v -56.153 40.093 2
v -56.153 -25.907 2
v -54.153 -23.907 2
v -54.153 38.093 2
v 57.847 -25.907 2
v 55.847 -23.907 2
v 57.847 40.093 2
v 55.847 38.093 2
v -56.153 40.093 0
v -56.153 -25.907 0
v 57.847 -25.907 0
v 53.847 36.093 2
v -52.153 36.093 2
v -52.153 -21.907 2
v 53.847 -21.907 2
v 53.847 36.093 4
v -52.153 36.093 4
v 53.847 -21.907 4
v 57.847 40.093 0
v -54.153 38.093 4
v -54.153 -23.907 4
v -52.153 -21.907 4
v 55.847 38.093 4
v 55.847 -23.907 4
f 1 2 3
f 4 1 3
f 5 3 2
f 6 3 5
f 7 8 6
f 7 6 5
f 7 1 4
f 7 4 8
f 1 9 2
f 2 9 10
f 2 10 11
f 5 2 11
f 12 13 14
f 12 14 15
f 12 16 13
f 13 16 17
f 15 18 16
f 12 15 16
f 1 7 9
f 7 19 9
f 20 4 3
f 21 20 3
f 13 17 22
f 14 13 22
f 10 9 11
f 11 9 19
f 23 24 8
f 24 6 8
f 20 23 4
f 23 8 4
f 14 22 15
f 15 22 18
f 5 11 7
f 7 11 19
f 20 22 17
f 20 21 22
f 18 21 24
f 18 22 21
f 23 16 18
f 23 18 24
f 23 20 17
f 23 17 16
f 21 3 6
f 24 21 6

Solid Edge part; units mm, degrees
sketch "Sketch1" plane through (0, 0, 0) normal (0, 0, 1) x (1, 0, 0)
  line L0 (-56.1534, -25.9068) -> (57.8466, -25.9068)
  line L1 (57.8466, -25.9068) -> (57.8466, 40.0932)
  line L2 (57.8466, 40.0932) -> (-56.1534, 40.0932)
  line L3 (-56.1534, 40.0932) -> (-56.1534, -25.9068)
extrude "Protrusion1" add sketch "Sketch1" along normal blind 2
sketch "Sketch2" plane through (0.8466, 7.0932, 2) normal (0, 0, 1) x (1, 0, 0)
  line L0 (-55, 31) -> (-55, -31)
  line L1 (-55, -31) -> (55, -31)
  line L2 (55, -31) -> (55, 31)
  line L3 (55, 31) -> (-55, 31)
extrude "ExtrudedProtrusion_2" add sketch "Sketch2" along normal blind 2
sketch "Sketch3" plane through (0.8466, 7.0932, 4) normal (0, 0, 1) x (1, 0, 0)
  line L0 (-53, 29) -> (-53, -29)
  line L1 (-53, -29) -> (53, -29)
  line L2 (53, -29) -> (53, 27)
  line L3 (53, 27) -> (53, 29)
  line L4 (53, 29) -> (-53, 29)
extrude "ExtrudedCutout_1" cut sketch "Sketch3" against normal blind 2
